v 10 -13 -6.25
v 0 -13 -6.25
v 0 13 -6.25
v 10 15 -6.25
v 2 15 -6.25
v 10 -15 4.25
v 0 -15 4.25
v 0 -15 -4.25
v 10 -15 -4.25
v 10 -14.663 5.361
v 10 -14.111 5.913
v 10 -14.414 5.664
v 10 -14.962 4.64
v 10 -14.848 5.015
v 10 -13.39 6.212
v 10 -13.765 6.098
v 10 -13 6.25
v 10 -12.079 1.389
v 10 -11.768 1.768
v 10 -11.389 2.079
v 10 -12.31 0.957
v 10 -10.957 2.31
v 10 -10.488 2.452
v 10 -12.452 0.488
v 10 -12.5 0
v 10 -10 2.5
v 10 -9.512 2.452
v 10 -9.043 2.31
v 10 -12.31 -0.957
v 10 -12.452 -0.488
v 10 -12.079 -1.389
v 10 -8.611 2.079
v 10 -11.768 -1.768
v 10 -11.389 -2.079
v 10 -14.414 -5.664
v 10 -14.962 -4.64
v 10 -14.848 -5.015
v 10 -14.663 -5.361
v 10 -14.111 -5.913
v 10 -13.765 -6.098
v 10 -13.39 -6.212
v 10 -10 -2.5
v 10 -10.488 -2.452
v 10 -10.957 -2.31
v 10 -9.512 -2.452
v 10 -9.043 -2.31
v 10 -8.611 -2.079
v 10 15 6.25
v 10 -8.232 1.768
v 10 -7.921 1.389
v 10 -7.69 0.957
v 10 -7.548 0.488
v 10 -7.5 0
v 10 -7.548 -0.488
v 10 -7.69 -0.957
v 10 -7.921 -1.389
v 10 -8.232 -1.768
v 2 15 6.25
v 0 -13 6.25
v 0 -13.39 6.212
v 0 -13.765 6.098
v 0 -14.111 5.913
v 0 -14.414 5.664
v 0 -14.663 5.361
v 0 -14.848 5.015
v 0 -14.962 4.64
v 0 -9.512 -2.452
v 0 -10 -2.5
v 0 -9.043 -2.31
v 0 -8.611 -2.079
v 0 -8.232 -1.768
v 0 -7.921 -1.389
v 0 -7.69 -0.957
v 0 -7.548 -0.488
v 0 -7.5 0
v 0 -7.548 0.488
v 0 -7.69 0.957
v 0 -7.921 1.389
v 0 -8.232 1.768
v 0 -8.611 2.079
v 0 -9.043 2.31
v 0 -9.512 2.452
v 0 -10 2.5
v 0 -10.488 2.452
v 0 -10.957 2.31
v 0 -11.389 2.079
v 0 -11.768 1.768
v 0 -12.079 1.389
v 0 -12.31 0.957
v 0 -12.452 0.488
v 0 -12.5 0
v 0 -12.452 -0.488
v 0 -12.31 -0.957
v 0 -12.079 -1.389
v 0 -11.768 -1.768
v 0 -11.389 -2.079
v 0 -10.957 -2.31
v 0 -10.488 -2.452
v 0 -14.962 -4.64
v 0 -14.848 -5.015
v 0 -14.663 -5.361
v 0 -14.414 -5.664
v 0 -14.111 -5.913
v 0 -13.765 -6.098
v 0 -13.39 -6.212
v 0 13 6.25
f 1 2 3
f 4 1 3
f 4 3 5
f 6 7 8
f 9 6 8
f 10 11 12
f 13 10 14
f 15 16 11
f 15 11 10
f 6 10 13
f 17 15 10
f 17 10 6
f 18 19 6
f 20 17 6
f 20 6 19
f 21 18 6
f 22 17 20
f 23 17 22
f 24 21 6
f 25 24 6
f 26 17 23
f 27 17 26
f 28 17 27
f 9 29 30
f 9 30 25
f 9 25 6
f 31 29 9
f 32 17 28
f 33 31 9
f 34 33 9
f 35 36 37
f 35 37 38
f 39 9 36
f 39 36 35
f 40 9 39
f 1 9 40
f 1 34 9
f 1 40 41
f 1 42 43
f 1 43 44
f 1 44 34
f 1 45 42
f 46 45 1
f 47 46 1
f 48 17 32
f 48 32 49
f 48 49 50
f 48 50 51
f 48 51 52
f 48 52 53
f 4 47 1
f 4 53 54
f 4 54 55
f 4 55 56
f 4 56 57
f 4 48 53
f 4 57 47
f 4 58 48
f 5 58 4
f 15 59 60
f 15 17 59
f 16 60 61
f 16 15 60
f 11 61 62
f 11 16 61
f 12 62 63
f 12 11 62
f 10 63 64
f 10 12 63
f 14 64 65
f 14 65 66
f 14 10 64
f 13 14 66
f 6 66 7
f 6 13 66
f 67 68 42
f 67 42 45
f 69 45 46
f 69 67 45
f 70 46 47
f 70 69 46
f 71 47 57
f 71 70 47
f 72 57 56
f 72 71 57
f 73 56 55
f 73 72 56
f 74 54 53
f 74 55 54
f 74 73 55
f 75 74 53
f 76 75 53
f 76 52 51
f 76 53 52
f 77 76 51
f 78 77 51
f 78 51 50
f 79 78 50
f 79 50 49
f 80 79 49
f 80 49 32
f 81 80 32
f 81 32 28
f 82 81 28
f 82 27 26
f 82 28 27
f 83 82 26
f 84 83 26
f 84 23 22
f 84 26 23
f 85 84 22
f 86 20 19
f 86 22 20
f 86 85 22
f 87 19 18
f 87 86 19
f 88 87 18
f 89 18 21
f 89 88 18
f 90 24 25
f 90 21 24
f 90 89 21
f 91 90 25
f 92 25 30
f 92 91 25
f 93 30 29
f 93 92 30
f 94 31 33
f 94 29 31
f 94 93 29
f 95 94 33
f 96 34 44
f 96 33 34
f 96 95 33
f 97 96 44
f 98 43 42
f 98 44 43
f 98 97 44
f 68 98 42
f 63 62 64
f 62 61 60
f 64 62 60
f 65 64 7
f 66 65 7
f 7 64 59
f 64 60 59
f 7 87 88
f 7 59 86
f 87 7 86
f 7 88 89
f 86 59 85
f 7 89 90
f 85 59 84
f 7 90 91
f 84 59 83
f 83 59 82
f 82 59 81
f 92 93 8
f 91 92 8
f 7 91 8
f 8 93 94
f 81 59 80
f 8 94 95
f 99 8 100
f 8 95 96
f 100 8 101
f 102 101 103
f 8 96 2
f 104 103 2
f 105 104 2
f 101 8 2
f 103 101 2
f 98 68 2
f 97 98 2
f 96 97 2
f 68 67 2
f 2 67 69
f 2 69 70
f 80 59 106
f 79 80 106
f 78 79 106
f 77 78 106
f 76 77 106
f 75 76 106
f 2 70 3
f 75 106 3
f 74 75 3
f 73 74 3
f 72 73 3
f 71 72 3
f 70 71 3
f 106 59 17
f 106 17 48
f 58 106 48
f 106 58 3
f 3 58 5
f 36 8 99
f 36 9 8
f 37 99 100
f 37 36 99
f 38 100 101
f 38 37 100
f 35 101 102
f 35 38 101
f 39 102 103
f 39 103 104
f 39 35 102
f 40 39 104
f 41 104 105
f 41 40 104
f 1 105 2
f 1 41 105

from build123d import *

# Parameters (mm, degrees)
SKETCH_1_W               = 12.5
SKETCH_1_H               = 30
EXTRUDE_1_DEPTH          = 10
CUT_EXTRUDE_1_DEPTH      = 20.080421903
CUT_EXTRUDE_1_DEPTH_BACK = 20.080421903
SKETCH_2_R               = 2.5
FILLET_1_R               = 2
CHAMFER_1_SIZE           = 2


with BuildPart() as part:
    # 草图1 → 凸台-拉伸1 (new body)
    with BuildSketch(Plane(origin=(0, 0, 0), x_dir=(0, 0, -1), z_dir=(1, 0, 0))):
        Rectangle(SKETCH_1_W, SKETCH_1_H)
    extrude(amount=EXTRUDE_1_DEPTH)

    # 草图2 → 切除-拉伸1 (cut, two sides: drawn at the far end of the back side and taken through both)
    with BuildSketch(Plane(origin=(10, 0, 0), x_dir=(0, 0, -1), z_dir=(1, 0, 0)).offset(-CUT_EXTRUDE_1_DEPTH_BACK)):
        with Locations((0, -10)):
            Circle(SKETCH_2_R)
    extrude(amount=CUT_EXTRUDE_1_DEPTH + CUT_EXTRUDE_1_DEPTH_BACK, mode=Mode.SUBTRACT)

    # 圆角1
    fillet_1_edges = [part.edges().sort_by_distance(p)[0] for p in [
        (5, -15, -6.25),
        (5, -15, 6.25),
    ]]
    fillet(fillet_1_edges, radius=FILLET_1_R)

    # 倒角1
    chamfer_1_edges = [part.edges().sort_by_distance(p)[0] for p in [
        (0, 15, 0),
    ]]
    chamfer(chamfer_1_edges, length=CHAMFER_1_SIZE)


solid = part.part
